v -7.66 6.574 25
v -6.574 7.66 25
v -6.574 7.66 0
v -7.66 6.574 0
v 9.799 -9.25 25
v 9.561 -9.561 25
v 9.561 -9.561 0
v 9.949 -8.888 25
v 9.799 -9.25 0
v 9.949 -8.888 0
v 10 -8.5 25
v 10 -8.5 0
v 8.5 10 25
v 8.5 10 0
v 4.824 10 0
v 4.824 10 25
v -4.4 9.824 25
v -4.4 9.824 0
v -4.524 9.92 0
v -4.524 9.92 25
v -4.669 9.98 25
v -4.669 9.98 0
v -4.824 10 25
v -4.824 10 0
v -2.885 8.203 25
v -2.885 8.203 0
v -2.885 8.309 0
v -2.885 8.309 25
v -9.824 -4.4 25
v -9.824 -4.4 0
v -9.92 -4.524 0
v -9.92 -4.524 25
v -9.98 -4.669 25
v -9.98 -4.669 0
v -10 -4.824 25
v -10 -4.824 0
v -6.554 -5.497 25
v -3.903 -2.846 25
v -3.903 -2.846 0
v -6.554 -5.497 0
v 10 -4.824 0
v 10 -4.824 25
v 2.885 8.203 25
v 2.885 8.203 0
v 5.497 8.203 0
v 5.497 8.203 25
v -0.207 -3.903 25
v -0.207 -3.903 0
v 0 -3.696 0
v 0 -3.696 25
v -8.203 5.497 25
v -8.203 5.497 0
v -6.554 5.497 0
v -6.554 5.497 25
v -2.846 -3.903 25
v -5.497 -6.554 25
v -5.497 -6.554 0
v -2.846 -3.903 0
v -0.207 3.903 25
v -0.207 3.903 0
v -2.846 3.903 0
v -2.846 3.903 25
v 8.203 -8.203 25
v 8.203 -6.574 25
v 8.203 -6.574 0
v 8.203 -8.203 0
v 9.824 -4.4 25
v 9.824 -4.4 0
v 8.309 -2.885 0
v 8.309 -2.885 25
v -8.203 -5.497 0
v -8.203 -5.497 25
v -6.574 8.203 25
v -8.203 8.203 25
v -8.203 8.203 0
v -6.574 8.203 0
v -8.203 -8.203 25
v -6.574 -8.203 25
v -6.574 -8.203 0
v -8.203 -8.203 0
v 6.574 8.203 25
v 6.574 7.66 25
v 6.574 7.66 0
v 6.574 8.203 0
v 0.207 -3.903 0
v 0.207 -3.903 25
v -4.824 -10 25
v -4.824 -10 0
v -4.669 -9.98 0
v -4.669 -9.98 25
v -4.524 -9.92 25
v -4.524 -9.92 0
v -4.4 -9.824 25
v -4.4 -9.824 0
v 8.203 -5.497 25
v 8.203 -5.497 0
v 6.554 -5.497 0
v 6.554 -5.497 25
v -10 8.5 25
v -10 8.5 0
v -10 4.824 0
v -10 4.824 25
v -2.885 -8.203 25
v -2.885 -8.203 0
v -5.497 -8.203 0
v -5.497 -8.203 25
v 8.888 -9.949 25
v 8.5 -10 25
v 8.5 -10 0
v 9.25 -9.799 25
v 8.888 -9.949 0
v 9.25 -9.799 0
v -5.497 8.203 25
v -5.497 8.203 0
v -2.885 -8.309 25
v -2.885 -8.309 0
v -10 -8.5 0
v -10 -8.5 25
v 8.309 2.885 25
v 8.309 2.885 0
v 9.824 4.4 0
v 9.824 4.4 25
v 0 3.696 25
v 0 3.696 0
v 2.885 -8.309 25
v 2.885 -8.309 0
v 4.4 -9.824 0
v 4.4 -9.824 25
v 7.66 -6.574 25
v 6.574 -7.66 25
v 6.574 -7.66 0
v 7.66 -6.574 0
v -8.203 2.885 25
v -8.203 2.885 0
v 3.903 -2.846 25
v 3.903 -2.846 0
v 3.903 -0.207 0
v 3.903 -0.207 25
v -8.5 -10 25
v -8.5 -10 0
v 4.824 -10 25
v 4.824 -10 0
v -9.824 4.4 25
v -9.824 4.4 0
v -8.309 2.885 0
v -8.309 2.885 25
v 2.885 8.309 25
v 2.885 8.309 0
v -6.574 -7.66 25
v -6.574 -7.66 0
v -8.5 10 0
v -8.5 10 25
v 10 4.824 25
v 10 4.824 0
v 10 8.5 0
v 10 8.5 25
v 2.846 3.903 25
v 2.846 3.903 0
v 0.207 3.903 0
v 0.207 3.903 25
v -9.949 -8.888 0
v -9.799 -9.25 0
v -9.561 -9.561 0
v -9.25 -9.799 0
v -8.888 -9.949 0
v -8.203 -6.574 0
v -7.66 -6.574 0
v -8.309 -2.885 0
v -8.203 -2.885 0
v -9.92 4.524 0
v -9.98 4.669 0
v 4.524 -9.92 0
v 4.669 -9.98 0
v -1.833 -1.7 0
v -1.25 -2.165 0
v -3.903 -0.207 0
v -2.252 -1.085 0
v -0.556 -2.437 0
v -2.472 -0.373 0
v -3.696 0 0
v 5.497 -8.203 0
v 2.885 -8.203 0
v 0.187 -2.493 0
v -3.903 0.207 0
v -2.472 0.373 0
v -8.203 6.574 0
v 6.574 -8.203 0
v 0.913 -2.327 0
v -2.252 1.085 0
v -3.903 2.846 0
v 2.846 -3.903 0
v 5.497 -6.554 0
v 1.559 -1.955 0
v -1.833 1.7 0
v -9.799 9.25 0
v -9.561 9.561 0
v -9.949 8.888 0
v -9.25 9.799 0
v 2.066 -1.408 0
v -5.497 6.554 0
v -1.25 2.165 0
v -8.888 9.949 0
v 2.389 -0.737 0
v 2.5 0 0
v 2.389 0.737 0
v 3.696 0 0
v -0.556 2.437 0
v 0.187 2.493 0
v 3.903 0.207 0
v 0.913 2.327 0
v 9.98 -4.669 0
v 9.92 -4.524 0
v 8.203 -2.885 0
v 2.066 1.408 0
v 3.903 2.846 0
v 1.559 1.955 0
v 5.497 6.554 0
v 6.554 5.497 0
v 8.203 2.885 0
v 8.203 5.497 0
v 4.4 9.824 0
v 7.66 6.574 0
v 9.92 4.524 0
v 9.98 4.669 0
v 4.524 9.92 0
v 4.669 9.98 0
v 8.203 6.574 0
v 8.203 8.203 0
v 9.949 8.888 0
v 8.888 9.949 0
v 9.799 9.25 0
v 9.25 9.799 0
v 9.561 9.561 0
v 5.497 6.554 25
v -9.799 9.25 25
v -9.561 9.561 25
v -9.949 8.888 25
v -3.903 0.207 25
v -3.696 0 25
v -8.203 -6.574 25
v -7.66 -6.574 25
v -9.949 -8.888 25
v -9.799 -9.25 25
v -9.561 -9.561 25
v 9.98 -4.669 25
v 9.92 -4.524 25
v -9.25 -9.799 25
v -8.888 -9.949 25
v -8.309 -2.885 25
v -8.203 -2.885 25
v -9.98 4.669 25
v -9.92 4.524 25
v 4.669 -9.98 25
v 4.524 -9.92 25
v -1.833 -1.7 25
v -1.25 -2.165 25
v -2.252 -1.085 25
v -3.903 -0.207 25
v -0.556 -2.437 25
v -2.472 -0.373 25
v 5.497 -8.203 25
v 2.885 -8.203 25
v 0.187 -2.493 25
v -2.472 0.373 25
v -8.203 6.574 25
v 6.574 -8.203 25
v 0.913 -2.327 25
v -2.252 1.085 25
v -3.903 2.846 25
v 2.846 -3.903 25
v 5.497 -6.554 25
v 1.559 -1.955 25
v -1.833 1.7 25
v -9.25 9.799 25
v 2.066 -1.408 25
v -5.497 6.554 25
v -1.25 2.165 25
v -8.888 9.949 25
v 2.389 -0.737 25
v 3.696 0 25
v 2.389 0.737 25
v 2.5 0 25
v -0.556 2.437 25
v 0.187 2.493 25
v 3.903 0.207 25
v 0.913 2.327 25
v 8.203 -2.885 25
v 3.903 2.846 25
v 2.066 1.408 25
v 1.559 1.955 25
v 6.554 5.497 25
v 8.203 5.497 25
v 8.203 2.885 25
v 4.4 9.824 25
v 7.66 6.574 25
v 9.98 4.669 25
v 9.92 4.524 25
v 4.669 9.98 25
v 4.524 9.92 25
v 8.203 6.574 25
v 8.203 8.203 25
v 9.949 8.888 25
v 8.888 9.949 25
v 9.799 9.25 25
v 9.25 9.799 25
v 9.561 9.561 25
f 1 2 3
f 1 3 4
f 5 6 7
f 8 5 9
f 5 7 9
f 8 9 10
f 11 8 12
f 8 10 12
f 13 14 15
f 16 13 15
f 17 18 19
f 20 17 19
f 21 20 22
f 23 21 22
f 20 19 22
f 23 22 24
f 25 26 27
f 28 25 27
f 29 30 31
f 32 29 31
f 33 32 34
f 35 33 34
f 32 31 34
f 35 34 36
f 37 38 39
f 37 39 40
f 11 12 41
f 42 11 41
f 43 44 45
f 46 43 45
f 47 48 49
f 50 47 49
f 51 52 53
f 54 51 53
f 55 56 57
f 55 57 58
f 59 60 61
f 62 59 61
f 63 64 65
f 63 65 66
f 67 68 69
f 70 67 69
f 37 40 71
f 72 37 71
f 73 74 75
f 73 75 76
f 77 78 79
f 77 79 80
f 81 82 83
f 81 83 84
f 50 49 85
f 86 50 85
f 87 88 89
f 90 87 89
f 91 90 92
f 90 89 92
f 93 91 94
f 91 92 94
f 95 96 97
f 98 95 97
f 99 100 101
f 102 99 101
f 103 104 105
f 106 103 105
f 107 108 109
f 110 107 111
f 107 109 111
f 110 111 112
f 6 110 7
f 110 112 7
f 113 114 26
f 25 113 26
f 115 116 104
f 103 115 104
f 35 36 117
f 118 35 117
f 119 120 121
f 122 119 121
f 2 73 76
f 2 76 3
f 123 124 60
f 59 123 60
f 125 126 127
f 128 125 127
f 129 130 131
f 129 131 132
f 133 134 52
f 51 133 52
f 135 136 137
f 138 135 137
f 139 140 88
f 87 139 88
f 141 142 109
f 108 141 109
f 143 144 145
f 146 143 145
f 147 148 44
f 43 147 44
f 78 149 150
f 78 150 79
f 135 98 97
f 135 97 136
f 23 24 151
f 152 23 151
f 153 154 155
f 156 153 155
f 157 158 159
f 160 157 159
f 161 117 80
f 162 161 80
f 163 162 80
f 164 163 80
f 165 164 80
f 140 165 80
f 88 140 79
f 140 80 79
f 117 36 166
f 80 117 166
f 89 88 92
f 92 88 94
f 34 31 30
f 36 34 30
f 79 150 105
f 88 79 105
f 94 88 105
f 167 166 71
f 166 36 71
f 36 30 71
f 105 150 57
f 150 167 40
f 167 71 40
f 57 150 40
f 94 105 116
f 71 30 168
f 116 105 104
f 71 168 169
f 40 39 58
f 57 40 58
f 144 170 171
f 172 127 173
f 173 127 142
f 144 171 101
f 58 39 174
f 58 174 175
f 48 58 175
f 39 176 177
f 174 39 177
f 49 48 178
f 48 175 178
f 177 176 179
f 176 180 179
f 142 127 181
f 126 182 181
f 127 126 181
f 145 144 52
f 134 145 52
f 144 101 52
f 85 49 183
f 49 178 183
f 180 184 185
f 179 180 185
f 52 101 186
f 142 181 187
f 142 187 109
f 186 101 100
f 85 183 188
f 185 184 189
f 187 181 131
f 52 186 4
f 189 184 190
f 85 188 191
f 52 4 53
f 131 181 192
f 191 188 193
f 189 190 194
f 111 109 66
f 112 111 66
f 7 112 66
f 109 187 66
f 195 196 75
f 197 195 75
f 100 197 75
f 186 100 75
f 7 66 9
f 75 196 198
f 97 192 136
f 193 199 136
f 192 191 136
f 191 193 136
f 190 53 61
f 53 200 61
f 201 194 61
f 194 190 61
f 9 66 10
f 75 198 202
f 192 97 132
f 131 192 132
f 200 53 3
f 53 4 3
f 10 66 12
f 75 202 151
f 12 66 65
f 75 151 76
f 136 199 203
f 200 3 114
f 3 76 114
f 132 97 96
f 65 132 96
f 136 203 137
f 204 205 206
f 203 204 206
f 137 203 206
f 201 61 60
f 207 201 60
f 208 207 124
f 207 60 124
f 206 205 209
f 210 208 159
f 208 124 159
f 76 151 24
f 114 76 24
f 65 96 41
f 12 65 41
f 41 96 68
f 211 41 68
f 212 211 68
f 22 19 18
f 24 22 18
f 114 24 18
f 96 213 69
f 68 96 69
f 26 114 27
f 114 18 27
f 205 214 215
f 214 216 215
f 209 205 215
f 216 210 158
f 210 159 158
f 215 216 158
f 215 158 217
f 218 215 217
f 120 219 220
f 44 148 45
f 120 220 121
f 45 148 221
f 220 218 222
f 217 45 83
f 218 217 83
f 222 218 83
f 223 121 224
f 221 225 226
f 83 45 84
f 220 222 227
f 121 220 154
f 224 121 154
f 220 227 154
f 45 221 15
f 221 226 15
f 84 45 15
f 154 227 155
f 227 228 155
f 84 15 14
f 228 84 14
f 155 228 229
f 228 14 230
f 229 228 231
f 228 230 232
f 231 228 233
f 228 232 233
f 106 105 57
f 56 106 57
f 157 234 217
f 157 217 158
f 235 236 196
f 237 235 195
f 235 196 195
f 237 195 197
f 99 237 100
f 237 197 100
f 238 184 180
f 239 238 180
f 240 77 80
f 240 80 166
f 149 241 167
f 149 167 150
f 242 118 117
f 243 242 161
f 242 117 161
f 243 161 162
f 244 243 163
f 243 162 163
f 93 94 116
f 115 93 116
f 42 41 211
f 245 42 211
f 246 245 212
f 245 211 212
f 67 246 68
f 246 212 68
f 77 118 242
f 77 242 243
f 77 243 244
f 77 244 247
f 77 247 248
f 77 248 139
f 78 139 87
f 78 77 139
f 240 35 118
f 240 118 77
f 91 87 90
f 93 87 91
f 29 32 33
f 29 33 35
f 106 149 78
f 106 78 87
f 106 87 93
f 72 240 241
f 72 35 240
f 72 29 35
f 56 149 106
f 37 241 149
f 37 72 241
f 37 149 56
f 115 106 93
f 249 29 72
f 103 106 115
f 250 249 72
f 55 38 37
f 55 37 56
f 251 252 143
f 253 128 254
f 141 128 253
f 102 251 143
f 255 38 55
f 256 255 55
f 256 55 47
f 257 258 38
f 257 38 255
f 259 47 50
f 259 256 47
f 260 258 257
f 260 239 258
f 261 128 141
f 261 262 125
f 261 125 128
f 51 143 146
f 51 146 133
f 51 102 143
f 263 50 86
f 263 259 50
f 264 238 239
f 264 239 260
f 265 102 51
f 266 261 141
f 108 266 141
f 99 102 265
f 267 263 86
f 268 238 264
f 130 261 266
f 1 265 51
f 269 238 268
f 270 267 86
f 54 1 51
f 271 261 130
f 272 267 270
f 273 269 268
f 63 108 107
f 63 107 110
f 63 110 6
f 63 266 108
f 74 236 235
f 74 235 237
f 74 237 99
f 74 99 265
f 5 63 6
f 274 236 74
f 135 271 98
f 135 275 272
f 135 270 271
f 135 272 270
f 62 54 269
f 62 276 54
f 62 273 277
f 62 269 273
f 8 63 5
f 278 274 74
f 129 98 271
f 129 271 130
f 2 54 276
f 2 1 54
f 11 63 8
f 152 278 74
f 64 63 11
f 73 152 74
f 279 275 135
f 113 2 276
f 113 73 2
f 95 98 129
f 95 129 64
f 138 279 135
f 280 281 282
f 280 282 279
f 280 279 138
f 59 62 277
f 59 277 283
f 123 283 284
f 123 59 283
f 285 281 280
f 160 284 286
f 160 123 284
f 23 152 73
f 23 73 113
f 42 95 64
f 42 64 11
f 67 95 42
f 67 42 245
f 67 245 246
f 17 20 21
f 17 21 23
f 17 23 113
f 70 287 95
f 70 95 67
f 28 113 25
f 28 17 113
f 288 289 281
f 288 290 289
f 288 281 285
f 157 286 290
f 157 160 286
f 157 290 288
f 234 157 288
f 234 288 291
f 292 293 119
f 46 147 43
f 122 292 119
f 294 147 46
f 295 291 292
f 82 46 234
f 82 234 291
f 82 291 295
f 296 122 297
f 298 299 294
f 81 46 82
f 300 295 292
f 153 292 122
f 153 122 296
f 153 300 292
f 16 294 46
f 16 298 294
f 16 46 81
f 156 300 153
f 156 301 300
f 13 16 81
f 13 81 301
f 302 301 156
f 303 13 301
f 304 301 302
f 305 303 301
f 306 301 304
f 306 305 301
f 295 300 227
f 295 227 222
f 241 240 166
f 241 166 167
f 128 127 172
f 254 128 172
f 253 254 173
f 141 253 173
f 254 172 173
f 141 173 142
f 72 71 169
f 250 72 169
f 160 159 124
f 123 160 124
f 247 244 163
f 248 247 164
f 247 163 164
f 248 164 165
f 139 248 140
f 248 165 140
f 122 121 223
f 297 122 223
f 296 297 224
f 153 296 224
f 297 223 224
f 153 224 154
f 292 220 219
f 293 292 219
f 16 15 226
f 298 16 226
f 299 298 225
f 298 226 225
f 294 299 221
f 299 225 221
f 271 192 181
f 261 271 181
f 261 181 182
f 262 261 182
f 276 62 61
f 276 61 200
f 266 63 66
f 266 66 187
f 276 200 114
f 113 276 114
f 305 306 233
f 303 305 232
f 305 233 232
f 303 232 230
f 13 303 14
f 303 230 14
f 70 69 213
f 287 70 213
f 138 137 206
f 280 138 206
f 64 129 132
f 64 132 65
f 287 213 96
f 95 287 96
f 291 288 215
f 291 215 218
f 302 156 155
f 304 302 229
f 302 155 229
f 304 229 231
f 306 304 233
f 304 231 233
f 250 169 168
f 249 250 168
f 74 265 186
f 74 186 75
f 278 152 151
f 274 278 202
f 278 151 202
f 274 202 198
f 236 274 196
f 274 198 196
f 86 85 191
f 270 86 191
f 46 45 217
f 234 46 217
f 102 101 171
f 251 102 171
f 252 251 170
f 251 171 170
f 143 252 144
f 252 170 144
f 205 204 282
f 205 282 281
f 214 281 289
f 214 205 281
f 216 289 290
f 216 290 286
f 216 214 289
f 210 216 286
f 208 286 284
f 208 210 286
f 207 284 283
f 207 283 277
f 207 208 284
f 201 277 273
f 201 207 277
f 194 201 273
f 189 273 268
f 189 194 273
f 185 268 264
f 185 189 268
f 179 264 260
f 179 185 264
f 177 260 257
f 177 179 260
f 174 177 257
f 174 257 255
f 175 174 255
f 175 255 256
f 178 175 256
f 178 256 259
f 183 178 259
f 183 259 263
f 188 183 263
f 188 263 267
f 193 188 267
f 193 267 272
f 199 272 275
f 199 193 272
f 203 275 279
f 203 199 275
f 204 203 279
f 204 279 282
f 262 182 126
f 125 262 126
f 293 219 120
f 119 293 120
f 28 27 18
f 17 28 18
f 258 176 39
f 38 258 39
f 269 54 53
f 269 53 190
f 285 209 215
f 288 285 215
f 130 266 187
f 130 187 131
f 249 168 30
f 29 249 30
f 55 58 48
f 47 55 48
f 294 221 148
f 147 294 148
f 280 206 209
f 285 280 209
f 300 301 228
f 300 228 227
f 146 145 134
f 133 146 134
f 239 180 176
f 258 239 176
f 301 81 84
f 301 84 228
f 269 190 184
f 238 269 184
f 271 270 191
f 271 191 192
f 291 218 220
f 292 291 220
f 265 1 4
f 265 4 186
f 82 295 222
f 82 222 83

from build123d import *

# Parameters (mm, degrees)
F0_R     = 2.5
F1_DEPTH = 25


with BuildPart() as f1:
    # F0 (on Top) → F1 (new body)
    with BuildSketch(Plane.XY):
        with BuildLine():
            Line((-0.206975, 3.902523), (-2.845819, 3.902523))
            Line((-2.845819, 3.902523), (-5.497237, 6.55394))
            Line((-5.497237, 6.55394), (-5.497237, 8.202523))
            Line((-5.497237, 8.202523), (-2.885113, 8.202523))
            Line((-2.885113, 8.202523), (-2.885113, 8.30915))
            Line((-2.885113, 8.30915), (-4.400227, 9.824264))
            ThreePointArc((-4.400227, 9.824264), (-4.594881, 9.954328), (-4.824491, 10))
            Line((-4.824491, 10), (-8.5, 10))
            ThreePointArc((-8.5, 10), (-9.074025, 9.885819), (-9.56066, 9.56066))
            ThreePointArc((-9.56066, 9.56066), (-9.885819, 9.074025), (-10, 8.5))
            Line((-10, 8.5), (-10, 4.824491))
            ThreePointArc((-10, 4.824491), (-9.954328, 4.594881), (-9.824264, 4.400227))
            Line((-9.824264, 4.400227), (-8.30915, 2.885113))
            Line((-8.30915, 2.885113), (-8.202523, 2.885113))
            Line((-8.202523, 2.885113), (-8.202523, 5.497237))
            Line((-8.202523, 5.497237), (-6.55394, 5.497237))
            Line((-6.55394, 5.497237), (-3.902523, 2.845819))
            Line((-3.902523, 2.845819), (-3.902523, 0.206975))
            Line((-3.902523, 0.206975), (-3.695548, 0))
            Line((-3.695548, 0), (-3.902523, -0.206975))
            Line((-3.902523, -0.206975), (-3.902523, -2.845819))
            Line((-3.902523, -2.845819), (-6.55394, -5.497237))
            Line((-6.55394, -5.497237), (-8.202523, -5.497237))
            Line((-8.202523, -5.497237), (-8.202523, -2.885113))
            Line((-8.202523, -2.885113), (-8.30915, -2.885113))
            Line((-8.30915, -2.885113), (-9.824264, -4.400227))
            ThreePointArc((-9.824264, -4.400227), (-9.954328, -4.594881), (-10, -4.824491))
            Line((-10, -4.824491), (-10, -8.5))
            ThreePointArc((-10, -8.5), (-9.885819, -9.074025), (-9.56066, -9.56066))
            ThreePointArc((-9.56066, -9.56066), (-9.074025, -9.885819), (-8.5, -10))
            Line((-8.5, -10), (-4.824491, -10))
            ThreePointArc((-4.824491, -10), (-4.594881, -9.954328), (-4.400227, -9.824264))
            Line((-4.400227, -9.824264), (-2.885113, -8.30915))
            Line((-2.885113, -8.30915), (-2.885113, -8.202523))
            Line((-2.885113, -8.202523), (-5.497237, -8.202523))
            Line((-5.497237, -8.202523), (-5.497237, -6.55394))
            Line((-5.497237, -6.55394), (-2.845819, -3.902523))
            Line((-2.845819, -3.902523), (-0.206975, -3.902523))
            Line((-0.206975, -3.902523), (0, -3.695548))
            Line((0, -3.695548), (0.206975, -3.902523))
            Line((0.206975, -3.902523), (2.845819, -3.902523))
            Line((2.845819, -3.902523), (5.497237, -6.55394))
            Line((5.497237, -6.55394), (5.497237, -8.202523))
            Line((5.497237, -8.202523), (2.885113, -8.202523))
            Line((2.885113, -8.202523), (2.885113, -8.30915))
            Line((2.885113, -8.30915), (4.400227, -9.824264))
            ThreePointArc((4.400227, -9.824264), (4.594881, -9.954328), (4.824491, -10))
            Line((4.824491, -10), (8.5, -10))
            ThreePointArc((8.5, -10), (9.074025, -9.885819), (9.56066, -9.56066))
            ThreePointArc((9.56066, -9.56066), (9.885819, -9.074025), (10, -8.5))
            Line((10, -8.5), (10, -4.824491))
            ThreePointArc((10, -4.824491), (9.954328, -4.594881), (9.824264, -4.400227))
            Line((9.824264, -4.400227), (8.30915, -2.885113))
            Line((8.30915, -2.885113), (8.202523, -2.885113))
            Line((8.202523, -2.885113), (8.202523, -5.497237))
            Line((8.202523, -5.497237), (6.55394, -5.497237))
            Line((6.55394, -5.497237), (3.902523, -2.845819))
            Line((3.902523, -2.845819), (3.902523, -0.206975))
            Line((3.902523, -0.206975), (3.695548, 0))
            Line((3.695548, 0), (3.902523, 0.206975))
            Line((3.902523, 0.206975), (3.902523, 2.845819))
            Line((3.902523, 2.845819), (6.55394, 5.497237))
            Line((6.55394, 5.497237), (8.202523, 5.497237))
            Line((8.202523, 5.497237), (8.202523, 2.885113))
            Line((8.202523, 2.885113), (8.30915, 2.885113))
            Line((8.30915, 2.885113), (9.824264, 4.400227))
            ThreePointArc((9.824264, 4.400227), (9.954328, 4.594881), (10, 4.824491))
            Line((10, 4.824491), (10, 8.5))
            ThreePointArc((10, 8.5), (9.885819, 9.074025), (9.56066, 9.56066))
            ThreePointArc((9.56066, 9.56066), (9.074025, 9.885819), (8.5, 10))
            Line((8.5, 10), (4.824491, 10))
            ThreePointArc((4.824491, 10), (4.594881, 9.954328), (4.400227, 9.824264))
            Line((4.400227, 9.824264), (2.885113, 8.30915))
            Line((2.885113, 8.30915), (2.885113, 8.202523))
            Line((2.885113, 8.202523), (5.497237, 8.202523))
            Line((5.497237, 8.202523), (5.497237, 6.55394))
            Line((5.497237, 6.55394), (2.845819, 3.902523))
            Line((2.845819, 3.902523), (0.206975, 3.902523))
            Line((0.206975, 3.902523), (0, 3.695548))
            Line((0, 3.695548), (-0.206975, 3.902523))
        make_face()
        Polygon((-7.11684, -7.11684), (-6.573574, -7.660106), (-6.573574, -8.202523), (-8.202523, -8.202523), (-8.202523, -6.573574), (-7.660106, -6.573574), align=None, mode=Mode.SUBTRACT)
        Polygon((7.11684, -7.11684), (7.660106, -6.573574), (8.202523, -6.573574), (8.202523, -8.202523), (6.573574, -8.202523), (6.573574, -7.660106), align=None, mode=Mode.SUBTRACT)
        Polygon((-6.573574, 8.202523), (-6.573574, 7.660106), (-7.11684, 7.11684), (-7.660106, 6.573574), (-8.202523, 6.573574), (-8.202523, 8.202523), align=None, mode=Mode.SUBTRACT)
        Circle(F0_R, mode=Mode.SUBTRACT)
        Polygon((7.11684, 7.11684), (6.573574, 7.660106), (6.573574, 8.202523), (8.202523, 8.202523), (8.202523, 6.573574), (7.660106, 6.573574), align=None, mode=Mode.SUBTRACT)
    extrude(amount=F1_DEPTH)


solid = f1.part
